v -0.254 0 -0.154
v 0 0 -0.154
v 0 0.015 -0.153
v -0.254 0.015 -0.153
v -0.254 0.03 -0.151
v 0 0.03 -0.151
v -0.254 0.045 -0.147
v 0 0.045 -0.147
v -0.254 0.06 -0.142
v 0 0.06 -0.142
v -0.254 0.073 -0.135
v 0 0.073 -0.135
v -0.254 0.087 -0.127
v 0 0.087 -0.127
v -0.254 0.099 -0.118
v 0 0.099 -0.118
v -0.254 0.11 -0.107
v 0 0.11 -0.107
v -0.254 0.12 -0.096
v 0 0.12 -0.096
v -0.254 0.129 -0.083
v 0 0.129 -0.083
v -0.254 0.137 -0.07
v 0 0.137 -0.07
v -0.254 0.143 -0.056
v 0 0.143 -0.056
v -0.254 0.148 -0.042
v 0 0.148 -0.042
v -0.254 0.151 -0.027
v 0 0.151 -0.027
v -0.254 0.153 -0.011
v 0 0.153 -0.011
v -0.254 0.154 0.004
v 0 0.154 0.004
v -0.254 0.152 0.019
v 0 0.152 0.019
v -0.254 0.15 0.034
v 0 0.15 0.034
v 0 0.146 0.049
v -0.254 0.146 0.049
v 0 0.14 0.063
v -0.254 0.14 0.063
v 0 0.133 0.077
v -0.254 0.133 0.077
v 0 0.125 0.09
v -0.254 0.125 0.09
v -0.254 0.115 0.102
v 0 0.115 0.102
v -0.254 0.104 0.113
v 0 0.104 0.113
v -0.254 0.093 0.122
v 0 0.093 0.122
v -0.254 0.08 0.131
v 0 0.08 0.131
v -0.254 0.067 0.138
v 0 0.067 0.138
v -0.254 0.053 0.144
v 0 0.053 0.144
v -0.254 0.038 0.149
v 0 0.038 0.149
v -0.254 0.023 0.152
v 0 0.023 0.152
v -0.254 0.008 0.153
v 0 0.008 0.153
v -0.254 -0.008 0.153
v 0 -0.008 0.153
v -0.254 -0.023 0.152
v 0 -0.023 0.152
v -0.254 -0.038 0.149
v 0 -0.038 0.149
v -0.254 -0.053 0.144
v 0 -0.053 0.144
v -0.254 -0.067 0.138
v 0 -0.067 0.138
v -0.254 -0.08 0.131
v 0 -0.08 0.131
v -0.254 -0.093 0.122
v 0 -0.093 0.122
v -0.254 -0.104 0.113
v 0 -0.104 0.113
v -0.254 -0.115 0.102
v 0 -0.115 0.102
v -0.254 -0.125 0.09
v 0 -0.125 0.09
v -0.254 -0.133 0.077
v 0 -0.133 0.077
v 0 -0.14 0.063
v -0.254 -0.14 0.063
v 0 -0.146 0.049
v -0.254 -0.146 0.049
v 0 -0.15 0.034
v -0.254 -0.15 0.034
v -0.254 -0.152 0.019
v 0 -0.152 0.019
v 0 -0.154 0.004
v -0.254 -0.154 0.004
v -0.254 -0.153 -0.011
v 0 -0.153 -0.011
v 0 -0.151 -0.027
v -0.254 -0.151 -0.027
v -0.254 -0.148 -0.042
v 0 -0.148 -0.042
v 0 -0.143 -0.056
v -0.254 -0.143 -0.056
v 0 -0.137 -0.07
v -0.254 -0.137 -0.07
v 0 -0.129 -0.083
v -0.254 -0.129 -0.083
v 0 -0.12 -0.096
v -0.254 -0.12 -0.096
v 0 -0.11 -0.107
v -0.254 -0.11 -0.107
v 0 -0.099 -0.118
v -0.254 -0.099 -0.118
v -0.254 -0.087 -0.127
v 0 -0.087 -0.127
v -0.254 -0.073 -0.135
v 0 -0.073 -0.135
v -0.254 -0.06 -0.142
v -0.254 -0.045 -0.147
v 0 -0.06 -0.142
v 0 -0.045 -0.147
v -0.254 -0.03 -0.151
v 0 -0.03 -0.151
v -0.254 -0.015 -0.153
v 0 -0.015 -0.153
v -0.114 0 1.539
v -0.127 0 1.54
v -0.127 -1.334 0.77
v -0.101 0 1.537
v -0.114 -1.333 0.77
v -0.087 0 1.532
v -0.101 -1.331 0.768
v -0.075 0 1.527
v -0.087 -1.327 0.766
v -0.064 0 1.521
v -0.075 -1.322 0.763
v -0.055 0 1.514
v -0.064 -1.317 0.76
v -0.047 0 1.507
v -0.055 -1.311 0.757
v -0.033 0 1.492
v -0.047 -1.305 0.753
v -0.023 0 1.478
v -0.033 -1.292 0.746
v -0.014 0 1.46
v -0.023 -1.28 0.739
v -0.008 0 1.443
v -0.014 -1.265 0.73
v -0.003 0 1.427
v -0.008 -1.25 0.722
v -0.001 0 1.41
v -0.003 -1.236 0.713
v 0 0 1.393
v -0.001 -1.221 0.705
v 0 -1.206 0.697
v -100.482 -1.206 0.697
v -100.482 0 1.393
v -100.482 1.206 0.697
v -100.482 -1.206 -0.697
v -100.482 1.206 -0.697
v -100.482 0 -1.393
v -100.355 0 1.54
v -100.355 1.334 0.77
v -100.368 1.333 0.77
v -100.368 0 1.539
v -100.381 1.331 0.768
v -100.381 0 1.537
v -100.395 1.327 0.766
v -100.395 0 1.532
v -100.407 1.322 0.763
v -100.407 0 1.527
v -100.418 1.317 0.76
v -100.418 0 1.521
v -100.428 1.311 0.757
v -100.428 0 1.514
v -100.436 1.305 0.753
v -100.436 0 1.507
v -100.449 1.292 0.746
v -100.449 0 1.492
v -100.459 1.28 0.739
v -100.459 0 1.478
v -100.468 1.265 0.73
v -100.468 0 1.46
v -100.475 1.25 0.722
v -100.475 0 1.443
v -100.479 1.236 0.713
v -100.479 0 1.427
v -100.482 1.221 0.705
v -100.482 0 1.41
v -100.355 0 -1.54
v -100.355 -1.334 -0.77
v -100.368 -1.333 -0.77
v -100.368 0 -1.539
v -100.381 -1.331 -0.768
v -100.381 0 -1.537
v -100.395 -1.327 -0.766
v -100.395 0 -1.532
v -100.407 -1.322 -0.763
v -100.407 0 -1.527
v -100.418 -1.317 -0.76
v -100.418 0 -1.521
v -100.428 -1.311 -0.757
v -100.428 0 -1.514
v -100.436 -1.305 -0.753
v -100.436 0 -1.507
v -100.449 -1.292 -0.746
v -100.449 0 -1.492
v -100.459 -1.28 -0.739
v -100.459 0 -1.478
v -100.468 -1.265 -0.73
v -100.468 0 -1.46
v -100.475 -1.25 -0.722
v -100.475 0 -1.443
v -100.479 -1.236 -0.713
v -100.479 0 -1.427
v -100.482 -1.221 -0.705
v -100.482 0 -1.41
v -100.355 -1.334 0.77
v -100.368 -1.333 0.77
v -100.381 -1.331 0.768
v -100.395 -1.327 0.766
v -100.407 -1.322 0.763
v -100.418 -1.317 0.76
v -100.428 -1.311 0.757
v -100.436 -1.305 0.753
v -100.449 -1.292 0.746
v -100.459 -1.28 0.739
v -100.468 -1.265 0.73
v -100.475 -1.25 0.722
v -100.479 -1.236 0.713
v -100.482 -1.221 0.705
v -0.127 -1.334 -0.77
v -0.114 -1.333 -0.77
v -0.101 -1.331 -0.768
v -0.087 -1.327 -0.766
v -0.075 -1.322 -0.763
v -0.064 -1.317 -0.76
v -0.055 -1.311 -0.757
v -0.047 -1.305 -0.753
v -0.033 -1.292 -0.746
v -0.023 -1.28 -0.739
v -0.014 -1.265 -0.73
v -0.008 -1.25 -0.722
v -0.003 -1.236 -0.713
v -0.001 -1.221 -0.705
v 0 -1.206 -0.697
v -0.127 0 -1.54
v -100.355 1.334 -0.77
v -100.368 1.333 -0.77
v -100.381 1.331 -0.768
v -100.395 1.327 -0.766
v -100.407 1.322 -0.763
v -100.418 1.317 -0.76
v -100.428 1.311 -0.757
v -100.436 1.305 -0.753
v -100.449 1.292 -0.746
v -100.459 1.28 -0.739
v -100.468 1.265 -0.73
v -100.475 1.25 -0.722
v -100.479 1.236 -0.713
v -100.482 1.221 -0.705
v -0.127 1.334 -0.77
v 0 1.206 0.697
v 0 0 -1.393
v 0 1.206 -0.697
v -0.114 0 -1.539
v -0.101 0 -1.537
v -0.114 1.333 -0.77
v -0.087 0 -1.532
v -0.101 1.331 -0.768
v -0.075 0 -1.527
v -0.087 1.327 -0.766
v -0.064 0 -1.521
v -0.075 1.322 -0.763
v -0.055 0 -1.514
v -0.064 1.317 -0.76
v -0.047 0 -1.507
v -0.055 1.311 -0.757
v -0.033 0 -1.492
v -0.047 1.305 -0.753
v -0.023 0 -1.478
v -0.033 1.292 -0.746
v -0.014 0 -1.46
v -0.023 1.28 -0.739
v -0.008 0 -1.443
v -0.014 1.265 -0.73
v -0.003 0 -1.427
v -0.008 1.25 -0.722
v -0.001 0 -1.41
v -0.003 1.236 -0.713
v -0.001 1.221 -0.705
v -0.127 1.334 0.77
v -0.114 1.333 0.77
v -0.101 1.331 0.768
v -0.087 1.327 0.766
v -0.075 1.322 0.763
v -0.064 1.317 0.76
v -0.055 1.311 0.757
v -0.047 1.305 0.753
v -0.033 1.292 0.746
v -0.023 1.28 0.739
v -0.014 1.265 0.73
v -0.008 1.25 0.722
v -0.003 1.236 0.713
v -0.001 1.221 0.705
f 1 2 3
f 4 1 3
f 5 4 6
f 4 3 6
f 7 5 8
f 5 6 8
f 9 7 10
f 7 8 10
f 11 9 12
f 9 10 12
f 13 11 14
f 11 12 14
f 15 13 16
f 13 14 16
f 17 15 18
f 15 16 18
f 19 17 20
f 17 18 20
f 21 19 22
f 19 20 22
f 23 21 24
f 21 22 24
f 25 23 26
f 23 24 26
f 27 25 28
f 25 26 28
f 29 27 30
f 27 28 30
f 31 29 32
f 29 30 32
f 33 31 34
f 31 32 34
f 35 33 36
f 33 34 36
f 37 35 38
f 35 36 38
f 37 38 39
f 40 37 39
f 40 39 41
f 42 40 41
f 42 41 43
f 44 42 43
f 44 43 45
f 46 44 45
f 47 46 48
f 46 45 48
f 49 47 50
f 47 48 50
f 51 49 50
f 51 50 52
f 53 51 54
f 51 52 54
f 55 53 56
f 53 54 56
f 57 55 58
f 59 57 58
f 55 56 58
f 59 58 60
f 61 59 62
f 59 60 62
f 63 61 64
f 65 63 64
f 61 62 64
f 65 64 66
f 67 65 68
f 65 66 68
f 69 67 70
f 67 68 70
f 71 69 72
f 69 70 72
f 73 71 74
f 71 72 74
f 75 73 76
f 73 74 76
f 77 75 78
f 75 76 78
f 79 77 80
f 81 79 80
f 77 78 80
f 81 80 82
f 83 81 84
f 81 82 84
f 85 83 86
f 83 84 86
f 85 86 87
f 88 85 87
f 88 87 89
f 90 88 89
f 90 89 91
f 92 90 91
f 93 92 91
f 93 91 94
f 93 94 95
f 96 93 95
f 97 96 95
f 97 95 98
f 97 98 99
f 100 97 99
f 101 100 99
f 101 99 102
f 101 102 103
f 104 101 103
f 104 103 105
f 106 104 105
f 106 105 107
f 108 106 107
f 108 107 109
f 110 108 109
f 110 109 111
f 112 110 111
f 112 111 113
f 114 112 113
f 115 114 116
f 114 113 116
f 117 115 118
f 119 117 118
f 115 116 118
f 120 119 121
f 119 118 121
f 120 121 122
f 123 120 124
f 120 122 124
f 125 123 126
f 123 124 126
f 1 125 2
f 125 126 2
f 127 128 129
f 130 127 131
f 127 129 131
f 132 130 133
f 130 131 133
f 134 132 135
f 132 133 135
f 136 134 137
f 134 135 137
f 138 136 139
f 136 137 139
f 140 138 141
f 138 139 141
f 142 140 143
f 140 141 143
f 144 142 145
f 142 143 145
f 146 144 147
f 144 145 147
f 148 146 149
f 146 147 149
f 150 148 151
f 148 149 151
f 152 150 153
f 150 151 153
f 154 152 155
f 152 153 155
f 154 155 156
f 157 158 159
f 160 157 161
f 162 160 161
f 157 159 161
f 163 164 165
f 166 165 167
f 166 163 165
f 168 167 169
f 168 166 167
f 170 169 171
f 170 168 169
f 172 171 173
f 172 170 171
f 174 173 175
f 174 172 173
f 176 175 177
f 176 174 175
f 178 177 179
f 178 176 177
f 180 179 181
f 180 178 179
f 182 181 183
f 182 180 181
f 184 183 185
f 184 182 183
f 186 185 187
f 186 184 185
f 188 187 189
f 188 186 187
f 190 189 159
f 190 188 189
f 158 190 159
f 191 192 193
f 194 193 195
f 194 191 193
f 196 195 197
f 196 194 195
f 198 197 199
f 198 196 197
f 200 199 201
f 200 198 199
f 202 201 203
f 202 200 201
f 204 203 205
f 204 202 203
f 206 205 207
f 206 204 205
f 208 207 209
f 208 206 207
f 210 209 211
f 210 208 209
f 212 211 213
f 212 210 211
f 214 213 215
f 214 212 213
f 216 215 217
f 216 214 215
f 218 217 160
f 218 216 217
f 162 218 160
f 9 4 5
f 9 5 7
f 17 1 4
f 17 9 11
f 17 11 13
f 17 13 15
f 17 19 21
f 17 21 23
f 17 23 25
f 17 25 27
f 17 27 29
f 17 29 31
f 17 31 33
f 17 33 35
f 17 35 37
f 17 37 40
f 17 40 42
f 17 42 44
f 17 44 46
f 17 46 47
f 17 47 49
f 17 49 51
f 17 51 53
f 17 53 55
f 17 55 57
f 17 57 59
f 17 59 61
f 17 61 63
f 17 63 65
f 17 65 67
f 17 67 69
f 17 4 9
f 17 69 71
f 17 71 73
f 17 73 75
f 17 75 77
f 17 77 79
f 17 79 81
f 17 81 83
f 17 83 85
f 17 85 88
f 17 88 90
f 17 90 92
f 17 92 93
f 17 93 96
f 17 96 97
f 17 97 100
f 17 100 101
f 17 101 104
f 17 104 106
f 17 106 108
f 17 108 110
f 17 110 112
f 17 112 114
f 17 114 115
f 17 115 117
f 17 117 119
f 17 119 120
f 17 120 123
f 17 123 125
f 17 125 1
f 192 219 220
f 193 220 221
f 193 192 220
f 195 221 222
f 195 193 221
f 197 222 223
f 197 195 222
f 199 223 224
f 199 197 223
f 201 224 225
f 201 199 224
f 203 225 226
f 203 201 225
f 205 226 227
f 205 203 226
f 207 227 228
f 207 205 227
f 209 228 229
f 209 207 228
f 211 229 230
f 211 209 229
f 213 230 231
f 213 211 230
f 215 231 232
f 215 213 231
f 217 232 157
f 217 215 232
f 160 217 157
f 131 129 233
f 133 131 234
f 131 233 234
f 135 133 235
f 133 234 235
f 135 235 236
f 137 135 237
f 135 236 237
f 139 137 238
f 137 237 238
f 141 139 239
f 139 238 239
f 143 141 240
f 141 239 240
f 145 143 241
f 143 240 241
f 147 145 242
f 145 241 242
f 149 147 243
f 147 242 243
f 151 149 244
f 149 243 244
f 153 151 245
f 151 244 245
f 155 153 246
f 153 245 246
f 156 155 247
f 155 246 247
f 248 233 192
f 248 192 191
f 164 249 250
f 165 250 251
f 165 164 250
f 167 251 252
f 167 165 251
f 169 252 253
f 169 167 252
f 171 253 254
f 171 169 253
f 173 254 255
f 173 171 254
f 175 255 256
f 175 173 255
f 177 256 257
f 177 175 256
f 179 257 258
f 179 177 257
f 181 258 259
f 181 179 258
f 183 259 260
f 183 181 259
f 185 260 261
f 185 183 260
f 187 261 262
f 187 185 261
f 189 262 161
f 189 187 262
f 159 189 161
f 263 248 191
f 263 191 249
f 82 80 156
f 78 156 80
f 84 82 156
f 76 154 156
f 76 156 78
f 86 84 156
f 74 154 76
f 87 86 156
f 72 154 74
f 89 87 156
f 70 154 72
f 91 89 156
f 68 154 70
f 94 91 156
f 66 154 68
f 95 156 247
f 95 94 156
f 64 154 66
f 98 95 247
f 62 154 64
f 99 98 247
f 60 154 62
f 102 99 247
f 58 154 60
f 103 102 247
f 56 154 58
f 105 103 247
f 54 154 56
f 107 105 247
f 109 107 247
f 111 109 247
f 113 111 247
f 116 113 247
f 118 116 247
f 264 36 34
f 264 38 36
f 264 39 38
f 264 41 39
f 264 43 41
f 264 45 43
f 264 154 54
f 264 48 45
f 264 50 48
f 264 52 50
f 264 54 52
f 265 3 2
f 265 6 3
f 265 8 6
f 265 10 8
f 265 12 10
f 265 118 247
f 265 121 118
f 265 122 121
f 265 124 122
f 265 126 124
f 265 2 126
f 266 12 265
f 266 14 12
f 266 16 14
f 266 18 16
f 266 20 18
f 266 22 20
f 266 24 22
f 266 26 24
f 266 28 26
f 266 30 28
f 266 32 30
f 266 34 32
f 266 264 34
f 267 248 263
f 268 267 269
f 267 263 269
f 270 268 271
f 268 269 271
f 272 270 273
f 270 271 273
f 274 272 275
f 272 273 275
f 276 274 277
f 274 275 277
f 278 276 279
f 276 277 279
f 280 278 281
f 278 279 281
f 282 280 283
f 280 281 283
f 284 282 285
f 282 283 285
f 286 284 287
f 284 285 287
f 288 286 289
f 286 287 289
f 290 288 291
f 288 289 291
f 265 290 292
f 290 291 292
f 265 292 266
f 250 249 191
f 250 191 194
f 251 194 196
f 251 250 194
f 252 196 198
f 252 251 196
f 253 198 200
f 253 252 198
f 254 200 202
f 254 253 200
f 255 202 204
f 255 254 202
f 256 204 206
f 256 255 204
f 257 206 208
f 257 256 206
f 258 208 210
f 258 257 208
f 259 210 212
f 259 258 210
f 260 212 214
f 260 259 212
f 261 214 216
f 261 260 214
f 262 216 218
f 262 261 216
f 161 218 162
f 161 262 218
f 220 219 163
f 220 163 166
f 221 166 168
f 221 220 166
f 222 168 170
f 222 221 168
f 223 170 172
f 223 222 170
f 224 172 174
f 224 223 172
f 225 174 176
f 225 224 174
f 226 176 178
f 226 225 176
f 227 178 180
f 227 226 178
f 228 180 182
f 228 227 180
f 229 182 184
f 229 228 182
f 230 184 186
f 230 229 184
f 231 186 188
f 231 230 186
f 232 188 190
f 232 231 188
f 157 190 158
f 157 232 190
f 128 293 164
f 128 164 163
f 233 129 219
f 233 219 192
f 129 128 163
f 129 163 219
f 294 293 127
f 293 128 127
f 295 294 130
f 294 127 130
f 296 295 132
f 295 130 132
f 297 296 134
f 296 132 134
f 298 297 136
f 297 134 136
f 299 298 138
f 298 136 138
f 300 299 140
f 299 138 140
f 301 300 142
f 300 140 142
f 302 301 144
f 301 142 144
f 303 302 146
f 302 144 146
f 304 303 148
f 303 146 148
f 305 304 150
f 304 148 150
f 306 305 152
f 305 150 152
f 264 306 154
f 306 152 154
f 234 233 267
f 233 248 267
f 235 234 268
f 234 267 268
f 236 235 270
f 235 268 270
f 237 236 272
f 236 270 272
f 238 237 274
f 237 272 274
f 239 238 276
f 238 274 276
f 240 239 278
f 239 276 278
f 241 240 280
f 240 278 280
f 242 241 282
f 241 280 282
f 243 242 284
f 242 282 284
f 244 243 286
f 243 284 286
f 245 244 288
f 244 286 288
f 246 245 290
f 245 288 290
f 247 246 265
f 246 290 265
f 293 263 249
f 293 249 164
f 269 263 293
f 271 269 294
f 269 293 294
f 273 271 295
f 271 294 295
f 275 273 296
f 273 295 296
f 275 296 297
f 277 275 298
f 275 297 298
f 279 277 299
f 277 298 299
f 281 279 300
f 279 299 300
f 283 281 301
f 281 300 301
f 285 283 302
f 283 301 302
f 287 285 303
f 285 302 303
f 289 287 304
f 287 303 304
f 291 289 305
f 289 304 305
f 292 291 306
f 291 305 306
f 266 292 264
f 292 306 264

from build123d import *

# Parameters (mm, degrees)
BOSS_EXTRUDE1_DEPTH = 100.4824
FILLET1_R           = 0.127
SKETCH2_R           = 0.153628899
CUT_EXTRUDE1_DEPTH  = 0.254


with BuildPart() as part:
    # Sketch1 → Boss-Extrude1 (new body)
    with BuildSketch(Plane(origin=(0, 0, 0), x_dir=(0, 0, -1), z_dir=(1, 0, 0))):
        Polygon((1.539793168, 0), (0.769896584, 1.3335), (-0.769896584, 1.3335), (-1.539793168, 0), (-0.769896584, -1.3335), (0.769896584, -1.3335), align=None)
    extrude(amount=-BOSS_EXTRUDE1_DEPTH)

    # Fillet1
    fillet1_edges = [part.edges().sort_by_distance(p)[0] for p in [
        (-100.4824, 1.3335, 0),
        (-100.4824, 0.66675, 1.154844876),
        (-100.4824, -0.66675, 1.154844876),
        (-100.4824, -1.3335, 0),
        (-100.4824, -0.66675, -1.154844876),
        (0, -1.3335, 0),
        (0, -0.66675, 1.154844876),
        (0, 0.66675, 1.154844876),
        (-100.4824, 0.66675, -1.154844876),
        (0, 1.3335, 0),
        (0, 0.66675, -1.154844876),
        (0, -0.66675, -1.154844876),
    ]]
    fillet(fillet1_edges, radius=FILLET1_R)

    # Sketch2 → Cut-Extrude1 (cut)
    with BuildSketch(Plane(origin=(0, 0, 0), x_dir=(0, 0, -1), z_dir=(1, 0, 0))):
        Circle(SKETCH2_R)
    extrude(amount=-CUT_EXTRUDE1_DEPTH, mode=Mode.SUBTRACT)


solid = part.part
